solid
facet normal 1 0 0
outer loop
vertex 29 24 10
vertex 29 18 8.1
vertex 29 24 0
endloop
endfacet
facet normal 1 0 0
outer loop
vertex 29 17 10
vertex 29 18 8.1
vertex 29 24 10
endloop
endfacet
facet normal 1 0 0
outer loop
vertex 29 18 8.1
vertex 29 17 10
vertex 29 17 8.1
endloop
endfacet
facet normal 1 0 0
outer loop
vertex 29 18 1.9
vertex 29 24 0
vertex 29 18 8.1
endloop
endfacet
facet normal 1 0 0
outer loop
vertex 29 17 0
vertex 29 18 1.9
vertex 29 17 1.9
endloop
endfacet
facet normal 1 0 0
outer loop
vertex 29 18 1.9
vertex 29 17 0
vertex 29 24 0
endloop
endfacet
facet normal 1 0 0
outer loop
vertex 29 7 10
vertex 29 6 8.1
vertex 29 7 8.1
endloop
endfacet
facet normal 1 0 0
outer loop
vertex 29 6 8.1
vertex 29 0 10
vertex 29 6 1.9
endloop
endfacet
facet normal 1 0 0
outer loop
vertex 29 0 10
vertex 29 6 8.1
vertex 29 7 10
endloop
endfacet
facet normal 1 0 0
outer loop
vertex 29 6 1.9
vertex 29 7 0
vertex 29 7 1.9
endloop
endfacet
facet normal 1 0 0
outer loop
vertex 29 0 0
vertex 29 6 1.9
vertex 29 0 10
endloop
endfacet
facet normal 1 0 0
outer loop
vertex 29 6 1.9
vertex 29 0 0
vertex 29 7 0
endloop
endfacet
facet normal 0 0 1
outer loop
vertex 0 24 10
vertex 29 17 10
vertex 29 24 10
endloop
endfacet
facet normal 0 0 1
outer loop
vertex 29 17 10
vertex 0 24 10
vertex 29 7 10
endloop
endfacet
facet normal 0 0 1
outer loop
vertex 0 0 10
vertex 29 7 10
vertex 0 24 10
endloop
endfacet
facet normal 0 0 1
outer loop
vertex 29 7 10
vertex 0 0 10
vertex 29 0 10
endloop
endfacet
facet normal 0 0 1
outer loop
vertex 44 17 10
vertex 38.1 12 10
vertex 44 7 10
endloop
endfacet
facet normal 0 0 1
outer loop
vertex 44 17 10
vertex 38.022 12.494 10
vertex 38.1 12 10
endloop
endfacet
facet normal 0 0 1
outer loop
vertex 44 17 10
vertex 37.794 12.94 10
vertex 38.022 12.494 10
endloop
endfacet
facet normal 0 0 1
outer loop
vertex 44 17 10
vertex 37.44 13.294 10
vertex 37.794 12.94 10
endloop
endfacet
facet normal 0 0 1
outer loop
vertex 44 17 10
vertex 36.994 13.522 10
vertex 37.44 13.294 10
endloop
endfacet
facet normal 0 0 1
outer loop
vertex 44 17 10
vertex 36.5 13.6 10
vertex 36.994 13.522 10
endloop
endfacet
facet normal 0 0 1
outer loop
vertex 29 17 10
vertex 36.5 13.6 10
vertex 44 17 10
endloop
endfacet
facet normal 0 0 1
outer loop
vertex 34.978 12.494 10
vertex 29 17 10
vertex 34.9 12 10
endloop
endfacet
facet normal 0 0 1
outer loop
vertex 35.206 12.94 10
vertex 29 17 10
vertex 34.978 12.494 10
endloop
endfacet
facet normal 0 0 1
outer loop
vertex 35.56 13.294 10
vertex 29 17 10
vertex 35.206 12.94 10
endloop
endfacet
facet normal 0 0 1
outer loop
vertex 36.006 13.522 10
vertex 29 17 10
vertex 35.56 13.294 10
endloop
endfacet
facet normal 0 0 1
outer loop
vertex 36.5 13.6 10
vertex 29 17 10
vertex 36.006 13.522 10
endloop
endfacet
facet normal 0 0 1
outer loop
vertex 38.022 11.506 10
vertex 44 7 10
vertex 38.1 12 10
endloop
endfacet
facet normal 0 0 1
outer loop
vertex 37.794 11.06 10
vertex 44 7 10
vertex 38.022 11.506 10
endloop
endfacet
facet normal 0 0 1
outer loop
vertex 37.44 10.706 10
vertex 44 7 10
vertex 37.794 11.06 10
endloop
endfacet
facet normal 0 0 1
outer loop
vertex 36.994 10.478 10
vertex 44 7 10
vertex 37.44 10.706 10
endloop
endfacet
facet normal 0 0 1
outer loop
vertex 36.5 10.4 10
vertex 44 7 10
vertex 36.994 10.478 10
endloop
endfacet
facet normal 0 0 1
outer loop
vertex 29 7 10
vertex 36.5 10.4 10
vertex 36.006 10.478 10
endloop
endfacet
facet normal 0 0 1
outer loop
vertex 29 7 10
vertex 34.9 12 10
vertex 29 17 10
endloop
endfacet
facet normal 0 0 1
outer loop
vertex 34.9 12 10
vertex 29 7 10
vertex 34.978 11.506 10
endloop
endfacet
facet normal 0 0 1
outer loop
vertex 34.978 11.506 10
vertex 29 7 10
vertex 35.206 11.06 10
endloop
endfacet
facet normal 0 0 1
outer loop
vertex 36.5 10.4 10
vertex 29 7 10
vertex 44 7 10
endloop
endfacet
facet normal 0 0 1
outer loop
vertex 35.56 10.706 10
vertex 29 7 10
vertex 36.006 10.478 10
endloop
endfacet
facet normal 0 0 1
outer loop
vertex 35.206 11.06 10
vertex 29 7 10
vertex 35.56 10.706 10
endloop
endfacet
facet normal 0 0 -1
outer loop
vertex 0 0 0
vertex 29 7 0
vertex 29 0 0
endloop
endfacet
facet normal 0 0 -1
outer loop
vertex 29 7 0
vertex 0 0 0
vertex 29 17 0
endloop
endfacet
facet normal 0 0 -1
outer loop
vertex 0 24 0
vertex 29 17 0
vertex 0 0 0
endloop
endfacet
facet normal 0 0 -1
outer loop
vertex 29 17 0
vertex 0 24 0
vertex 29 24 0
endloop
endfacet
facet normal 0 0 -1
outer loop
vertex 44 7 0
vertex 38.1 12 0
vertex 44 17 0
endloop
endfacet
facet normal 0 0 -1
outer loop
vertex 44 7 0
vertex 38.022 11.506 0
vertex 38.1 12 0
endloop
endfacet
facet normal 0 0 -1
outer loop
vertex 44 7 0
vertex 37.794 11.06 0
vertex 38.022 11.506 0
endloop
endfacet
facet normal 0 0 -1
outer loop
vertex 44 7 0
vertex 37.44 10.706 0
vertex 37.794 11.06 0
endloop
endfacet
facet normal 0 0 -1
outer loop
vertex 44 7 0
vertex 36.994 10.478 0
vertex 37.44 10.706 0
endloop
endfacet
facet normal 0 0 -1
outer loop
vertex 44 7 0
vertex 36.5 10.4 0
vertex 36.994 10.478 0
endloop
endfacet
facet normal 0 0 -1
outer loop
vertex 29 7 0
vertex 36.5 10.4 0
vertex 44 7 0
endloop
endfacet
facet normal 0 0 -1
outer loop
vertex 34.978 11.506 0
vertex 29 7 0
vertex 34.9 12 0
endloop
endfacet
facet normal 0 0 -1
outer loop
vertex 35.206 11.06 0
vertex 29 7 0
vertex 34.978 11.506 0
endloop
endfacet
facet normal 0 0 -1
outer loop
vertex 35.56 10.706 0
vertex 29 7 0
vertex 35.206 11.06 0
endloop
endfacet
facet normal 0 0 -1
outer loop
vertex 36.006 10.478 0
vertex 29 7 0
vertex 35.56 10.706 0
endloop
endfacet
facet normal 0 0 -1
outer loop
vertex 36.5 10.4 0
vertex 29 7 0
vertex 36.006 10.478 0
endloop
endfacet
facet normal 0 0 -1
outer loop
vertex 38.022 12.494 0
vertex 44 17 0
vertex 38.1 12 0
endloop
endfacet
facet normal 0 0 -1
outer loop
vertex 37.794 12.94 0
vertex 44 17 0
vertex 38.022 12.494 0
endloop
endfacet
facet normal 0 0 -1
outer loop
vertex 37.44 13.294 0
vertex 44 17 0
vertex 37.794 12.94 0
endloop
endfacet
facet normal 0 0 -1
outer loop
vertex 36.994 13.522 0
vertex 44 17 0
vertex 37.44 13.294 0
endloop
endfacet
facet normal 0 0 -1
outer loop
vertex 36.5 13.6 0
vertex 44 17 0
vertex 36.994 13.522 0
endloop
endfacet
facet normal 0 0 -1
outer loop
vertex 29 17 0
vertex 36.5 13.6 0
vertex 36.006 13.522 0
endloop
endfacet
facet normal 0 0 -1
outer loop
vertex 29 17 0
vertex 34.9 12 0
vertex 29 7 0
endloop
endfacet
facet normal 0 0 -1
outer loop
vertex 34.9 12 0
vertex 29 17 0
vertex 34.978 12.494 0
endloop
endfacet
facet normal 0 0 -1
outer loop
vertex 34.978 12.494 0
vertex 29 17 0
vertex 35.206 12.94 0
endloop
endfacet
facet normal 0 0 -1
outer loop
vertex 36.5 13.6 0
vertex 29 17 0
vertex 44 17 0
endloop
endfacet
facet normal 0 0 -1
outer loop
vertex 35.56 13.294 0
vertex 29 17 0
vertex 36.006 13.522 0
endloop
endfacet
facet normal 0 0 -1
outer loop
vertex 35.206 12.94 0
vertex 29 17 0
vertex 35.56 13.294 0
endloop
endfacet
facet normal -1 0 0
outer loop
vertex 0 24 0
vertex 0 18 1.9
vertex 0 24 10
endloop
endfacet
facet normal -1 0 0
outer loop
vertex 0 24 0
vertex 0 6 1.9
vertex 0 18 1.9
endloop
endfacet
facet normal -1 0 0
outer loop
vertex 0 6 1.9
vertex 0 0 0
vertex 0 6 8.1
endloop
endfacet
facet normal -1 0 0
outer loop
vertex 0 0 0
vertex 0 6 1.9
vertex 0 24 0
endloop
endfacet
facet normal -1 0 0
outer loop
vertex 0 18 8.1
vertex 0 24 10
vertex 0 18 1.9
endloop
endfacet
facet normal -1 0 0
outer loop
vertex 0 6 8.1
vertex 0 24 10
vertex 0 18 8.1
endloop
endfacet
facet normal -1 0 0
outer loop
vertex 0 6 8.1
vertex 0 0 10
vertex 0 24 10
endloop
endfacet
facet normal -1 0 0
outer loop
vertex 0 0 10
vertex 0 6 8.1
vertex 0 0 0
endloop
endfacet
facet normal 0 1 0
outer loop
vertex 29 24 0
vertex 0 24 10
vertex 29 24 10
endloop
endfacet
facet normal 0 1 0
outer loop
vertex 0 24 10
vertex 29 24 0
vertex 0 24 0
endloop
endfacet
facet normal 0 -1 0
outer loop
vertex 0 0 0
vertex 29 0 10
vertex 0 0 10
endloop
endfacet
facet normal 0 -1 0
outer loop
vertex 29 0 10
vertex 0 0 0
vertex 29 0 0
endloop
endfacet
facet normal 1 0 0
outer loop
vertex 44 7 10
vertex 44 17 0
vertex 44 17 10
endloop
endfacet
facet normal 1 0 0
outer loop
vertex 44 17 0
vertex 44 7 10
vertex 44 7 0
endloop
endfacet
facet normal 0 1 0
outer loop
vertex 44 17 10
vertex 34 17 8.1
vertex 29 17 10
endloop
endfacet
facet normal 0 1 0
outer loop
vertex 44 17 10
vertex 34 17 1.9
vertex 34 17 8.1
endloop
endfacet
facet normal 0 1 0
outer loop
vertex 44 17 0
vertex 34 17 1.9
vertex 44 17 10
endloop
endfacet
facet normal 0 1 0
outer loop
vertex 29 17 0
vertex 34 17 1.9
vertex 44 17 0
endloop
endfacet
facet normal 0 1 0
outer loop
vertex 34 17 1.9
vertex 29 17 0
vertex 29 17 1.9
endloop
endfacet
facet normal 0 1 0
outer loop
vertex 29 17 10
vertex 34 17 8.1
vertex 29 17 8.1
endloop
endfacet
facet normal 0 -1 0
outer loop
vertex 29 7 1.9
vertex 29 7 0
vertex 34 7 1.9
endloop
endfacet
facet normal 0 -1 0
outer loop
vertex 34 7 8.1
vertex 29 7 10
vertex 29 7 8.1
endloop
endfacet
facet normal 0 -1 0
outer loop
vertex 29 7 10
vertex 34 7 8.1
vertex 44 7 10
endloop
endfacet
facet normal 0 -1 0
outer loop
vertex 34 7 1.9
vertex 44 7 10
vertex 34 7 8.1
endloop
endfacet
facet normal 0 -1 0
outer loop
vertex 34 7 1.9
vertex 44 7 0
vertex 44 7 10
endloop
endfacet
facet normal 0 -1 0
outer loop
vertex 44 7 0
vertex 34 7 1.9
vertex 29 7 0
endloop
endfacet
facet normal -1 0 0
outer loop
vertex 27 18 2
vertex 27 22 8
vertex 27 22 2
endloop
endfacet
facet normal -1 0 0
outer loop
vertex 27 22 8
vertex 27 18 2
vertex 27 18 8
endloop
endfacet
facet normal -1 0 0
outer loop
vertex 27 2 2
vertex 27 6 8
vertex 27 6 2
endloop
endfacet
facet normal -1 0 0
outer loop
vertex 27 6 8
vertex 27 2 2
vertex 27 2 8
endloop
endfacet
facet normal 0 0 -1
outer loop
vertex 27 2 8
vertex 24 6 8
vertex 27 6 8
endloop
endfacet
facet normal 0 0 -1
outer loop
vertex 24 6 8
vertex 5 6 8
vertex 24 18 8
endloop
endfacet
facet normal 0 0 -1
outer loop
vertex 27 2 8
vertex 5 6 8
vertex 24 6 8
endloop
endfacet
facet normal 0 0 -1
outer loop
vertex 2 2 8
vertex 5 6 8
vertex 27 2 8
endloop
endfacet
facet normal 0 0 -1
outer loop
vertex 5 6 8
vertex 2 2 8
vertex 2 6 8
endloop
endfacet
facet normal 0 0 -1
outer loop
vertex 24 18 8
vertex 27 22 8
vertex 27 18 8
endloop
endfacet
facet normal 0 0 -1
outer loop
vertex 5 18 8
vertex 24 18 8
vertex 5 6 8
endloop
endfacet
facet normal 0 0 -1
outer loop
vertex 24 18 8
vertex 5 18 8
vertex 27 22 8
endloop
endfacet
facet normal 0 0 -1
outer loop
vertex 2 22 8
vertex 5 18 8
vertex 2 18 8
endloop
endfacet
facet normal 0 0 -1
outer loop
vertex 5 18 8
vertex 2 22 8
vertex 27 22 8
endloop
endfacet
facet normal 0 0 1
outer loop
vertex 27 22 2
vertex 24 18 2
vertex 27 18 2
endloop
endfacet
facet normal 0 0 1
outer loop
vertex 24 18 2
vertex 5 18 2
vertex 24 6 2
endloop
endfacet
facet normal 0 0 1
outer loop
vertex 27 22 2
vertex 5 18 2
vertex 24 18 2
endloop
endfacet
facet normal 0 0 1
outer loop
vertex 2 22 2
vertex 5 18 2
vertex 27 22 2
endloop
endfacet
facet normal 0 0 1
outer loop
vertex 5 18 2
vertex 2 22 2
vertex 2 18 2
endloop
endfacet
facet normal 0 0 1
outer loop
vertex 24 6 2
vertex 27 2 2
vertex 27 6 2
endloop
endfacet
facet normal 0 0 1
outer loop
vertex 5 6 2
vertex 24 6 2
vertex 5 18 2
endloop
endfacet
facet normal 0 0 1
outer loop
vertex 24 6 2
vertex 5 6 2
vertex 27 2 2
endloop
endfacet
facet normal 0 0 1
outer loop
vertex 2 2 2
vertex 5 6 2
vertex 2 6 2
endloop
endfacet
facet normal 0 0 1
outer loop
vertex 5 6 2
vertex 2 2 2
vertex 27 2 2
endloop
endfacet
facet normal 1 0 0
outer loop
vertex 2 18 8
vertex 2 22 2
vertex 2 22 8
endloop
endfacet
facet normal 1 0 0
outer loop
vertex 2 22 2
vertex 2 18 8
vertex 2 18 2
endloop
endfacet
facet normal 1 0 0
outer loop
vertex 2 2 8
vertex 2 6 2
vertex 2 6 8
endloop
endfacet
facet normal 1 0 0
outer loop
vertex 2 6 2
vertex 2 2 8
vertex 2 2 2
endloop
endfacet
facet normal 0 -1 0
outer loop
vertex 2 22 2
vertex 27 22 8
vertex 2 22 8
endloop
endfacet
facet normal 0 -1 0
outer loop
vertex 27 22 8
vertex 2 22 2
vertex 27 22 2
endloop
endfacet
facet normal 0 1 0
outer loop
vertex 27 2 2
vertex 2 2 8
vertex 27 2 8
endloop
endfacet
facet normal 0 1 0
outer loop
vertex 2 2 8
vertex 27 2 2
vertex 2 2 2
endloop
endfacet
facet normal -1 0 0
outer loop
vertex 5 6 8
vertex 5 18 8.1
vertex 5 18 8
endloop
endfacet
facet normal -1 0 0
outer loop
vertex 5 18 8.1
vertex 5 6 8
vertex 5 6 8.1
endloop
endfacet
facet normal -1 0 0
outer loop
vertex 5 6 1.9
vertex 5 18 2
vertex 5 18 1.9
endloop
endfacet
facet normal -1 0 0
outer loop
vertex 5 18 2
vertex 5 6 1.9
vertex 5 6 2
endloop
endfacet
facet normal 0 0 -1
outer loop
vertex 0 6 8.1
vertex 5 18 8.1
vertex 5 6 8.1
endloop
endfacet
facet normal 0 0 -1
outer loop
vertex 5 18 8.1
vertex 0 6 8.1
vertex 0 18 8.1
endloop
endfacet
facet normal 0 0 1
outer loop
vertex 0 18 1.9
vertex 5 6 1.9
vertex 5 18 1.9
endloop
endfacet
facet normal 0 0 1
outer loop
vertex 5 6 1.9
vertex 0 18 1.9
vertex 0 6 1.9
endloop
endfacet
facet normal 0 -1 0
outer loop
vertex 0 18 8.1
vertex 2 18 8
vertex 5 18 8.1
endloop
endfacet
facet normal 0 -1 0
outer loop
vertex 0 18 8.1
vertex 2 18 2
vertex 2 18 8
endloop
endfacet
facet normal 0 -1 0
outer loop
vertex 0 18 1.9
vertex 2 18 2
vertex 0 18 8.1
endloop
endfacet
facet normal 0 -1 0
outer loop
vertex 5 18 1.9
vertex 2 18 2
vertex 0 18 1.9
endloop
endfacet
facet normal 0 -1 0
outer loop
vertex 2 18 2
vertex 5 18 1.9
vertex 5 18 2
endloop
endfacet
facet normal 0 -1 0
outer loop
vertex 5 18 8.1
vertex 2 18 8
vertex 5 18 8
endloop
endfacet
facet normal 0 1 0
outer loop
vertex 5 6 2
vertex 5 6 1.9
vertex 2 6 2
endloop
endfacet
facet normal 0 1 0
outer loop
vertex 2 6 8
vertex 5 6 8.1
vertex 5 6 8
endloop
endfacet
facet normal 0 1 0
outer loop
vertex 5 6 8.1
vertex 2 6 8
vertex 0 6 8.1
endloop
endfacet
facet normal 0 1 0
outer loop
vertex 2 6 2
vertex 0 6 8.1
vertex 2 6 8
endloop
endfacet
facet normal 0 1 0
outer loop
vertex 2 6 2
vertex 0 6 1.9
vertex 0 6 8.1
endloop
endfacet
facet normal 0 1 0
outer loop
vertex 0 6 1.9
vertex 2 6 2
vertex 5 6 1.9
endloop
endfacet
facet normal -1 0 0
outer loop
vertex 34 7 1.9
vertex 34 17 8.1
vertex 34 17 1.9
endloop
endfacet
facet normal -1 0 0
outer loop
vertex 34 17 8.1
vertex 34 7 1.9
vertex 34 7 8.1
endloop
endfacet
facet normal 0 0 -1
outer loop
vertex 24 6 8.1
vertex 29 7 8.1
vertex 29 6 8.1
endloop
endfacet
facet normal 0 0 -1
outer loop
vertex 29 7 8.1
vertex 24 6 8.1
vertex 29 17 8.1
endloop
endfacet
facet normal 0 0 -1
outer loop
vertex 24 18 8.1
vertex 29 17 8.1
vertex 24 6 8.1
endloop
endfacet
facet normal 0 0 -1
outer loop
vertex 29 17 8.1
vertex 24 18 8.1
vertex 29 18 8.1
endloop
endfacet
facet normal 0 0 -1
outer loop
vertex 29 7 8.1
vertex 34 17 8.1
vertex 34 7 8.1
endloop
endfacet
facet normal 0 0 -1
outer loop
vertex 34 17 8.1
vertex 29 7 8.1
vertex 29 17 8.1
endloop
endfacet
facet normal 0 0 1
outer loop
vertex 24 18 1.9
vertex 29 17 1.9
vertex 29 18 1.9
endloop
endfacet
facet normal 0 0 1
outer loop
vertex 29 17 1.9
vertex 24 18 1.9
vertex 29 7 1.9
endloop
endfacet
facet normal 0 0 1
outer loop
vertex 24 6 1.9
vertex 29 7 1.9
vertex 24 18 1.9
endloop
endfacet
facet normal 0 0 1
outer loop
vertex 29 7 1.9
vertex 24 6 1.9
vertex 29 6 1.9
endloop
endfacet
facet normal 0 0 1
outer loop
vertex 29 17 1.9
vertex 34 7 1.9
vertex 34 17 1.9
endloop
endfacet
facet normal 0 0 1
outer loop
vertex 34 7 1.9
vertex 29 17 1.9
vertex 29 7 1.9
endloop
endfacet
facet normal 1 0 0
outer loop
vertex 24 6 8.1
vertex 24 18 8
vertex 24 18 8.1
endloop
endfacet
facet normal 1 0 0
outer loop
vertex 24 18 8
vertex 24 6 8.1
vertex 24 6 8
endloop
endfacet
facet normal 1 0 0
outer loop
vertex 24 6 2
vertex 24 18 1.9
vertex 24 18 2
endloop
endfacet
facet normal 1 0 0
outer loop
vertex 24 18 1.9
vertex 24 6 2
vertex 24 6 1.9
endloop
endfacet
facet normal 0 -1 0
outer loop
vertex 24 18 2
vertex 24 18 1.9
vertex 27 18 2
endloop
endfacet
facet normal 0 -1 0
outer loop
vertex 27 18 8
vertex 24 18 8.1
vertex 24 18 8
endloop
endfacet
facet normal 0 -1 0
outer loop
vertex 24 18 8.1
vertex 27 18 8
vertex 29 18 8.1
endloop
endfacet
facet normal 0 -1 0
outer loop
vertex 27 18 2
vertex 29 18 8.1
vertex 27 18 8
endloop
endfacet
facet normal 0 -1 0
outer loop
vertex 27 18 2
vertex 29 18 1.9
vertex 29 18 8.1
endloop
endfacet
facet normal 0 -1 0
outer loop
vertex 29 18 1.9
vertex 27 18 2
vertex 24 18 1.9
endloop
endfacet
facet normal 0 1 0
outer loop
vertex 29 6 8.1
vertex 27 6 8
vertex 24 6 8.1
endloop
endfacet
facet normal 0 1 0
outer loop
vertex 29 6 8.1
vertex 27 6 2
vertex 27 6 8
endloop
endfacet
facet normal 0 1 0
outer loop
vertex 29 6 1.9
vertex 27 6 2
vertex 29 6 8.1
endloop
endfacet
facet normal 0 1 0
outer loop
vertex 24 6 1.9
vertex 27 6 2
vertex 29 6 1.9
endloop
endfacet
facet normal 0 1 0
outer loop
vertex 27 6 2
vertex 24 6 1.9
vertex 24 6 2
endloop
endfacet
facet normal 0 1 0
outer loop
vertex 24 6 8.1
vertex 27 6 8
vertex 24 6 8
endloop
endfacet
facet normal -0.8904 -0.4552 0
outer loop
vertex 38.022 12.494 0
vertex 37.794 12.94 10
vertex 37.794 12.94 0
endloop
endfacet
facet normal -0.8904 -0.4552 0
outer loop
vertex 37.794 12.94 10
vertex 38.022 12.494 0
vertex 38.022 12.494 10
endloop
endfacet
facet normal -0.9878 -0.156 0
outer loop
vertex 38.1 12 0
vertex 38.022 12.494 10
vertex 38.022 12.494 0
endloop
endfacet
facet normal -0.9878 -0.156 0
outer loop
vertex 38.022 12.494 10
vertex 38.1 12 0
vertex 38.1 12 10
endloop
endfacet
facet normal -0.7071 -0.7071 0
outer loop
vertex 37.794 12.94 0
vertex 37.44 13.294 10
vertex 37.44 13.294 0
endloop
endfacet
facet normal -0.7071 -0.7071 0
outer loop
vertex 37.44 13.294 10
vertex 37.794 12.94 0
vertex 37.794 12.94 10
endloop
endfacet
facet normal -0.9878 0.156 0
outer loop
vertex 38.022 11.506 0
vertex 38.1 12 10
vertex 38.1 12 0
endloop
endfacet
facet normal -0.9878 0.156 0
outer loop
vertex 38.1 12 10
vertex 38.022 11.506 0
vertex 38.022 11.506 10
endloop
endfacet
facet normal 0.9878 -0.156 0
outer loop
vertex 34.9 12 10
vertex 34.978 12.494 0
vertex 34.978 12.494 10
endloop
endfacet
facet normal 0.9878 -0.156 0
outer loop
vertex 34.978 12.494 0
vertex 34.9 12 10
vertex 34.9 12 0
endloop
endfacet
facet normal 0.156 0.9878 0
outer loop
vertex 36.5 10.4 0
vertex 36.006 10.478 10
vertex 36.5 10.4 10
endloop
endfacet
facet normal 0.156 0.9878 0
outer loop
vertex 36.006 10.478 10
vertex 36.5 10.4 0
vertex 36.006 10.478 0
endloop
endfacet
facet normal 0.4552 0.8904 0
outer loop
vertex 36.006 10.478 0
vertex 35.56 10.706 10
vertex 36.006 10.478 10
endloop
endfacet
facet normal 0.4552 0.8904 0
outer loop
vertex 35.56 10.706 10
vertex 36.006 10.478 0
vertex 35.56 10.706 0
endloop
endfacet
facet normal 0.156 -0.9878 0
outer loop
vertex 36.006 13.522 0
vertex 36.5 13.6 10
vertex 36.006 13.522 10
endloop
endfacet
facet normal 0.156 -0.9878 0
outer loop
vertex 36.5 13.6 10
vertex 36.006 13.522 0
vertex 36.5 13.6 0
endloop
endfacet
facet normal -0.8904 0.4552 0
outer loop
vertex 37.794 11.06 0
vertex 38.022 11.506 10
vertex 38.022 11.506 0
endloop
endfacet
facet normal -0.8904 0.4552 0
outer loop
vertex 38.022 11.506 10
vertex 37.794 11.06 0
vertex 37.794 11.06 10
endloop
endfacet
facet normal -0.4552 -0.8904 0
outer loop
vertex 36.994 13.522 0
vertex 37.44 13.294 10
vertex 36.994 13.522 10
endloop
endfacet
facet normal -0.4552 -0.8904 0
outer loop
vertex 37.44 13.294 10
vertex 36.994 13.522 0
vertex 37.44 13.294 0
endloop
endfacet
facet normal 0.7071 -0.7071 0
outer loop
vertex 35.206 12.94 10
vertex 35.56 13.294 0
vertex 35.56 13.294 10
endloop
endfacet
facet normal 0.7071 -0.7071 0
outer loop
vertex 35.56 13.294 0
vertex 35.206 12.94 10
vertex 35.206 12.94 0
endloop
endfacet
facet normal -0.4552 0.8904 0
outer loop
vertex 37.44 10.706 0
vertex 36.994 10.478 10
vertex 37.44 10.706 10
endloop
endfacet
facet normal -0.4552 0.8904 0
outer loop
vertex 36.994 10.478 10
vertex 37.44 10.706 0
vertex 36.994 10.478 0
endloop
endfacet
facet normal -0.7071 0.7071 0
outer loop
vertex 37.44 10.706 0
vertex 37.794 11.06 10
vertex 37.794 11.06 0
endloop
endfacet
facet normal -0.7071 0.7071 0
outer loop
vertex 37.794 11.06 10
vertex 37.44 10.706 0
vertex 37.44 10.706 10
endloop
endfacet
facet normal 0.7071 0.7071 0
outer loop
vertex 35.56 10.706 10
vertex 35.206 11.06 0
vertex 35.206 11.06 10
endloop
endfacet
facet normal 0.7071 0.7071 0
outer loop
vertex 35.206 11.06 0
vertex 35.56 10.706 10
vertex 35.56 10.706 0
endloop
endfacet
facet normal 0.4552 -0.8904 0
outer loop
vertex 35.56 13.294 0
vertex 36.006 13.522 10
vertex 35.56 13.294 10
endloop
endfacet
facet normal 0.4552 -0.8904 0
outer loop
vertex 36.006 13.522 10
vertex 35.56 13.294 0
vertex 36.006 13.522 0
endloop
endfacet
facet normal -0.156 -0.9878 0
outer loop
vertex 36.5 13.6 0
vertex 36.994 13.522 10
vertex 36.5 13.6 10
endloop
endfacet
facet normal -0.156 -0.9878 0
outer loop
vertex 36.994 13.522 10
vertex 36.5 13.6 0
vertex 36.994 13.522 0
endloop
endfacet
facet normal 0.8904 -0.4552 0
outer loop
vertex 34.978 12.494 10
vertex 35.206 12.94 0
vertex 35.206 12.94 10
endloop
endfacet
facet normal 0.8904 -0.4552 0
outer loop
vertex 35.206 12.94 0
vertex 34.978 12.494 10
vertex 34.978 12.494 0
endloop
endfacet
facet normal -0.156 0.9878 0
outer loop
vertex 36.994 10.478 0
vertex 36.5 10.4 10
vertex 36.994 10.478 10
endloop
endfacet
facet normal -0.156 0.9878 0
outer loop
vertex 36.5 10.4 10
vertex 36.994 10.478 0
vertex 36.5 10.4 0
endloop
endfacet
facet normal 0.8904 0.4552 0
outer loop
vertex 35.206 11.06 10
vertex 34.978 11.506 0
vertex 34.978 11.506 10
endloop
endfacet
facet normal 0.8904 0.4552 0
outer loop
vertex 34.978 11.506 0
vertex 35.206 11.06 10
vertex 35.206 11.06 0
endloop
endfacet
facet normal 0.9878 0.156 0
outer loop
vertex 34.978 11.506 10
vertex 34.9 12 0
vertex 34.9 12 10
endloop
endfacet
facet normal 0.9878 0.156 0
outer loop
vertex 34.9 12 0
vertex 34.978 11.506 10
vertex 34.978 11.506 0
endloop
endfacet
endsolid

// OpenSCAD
// ESP32-C3-Zero Mini Housing

// Board dimensions (with tolerance)
board_l = 25;
board_w = 20;
board_h = 6;
wall = 2;

// Box dimensions
box_l = board_l + wall*2;
box_w = board_w + wall*2;
box_h = board_h + wall*2;

module esp32_housing() {
    difference() {
        union() {
            // Main box
            cube([box_l, box_w, box_h]);
            
            // Mounting flange to attach to the digit's M3 hole
            translate([box_l, box_w/2 - 10/2, 0])
                cube([15, 10, box_h]);
        }
        
        // Hollow inner cavity for the board
        translate([wall, wall, wall])
            cube([board_l, board_w, board_h]);
            
        // Opening for USB-C port (front)
        translate([-5, box_w/2 - 6, wall - 0.1])
            cube([10, 12, board_h + 0.2]);
            
        // Opening for wires to the LED strip (back)
        translate([box_l - 5, box_w/2 - 6, wall - 0.1])
            cube([10, 12, board_h + 0.2]);
            
        // M3 screw hole on the mounting flange (to bolt to the display)
        translate([box_l + 7.5, box_w/2, -1])
            cylinder(h=box_h + 2, r=1.6, $fn=20);
    }
}

esp32_housing();
